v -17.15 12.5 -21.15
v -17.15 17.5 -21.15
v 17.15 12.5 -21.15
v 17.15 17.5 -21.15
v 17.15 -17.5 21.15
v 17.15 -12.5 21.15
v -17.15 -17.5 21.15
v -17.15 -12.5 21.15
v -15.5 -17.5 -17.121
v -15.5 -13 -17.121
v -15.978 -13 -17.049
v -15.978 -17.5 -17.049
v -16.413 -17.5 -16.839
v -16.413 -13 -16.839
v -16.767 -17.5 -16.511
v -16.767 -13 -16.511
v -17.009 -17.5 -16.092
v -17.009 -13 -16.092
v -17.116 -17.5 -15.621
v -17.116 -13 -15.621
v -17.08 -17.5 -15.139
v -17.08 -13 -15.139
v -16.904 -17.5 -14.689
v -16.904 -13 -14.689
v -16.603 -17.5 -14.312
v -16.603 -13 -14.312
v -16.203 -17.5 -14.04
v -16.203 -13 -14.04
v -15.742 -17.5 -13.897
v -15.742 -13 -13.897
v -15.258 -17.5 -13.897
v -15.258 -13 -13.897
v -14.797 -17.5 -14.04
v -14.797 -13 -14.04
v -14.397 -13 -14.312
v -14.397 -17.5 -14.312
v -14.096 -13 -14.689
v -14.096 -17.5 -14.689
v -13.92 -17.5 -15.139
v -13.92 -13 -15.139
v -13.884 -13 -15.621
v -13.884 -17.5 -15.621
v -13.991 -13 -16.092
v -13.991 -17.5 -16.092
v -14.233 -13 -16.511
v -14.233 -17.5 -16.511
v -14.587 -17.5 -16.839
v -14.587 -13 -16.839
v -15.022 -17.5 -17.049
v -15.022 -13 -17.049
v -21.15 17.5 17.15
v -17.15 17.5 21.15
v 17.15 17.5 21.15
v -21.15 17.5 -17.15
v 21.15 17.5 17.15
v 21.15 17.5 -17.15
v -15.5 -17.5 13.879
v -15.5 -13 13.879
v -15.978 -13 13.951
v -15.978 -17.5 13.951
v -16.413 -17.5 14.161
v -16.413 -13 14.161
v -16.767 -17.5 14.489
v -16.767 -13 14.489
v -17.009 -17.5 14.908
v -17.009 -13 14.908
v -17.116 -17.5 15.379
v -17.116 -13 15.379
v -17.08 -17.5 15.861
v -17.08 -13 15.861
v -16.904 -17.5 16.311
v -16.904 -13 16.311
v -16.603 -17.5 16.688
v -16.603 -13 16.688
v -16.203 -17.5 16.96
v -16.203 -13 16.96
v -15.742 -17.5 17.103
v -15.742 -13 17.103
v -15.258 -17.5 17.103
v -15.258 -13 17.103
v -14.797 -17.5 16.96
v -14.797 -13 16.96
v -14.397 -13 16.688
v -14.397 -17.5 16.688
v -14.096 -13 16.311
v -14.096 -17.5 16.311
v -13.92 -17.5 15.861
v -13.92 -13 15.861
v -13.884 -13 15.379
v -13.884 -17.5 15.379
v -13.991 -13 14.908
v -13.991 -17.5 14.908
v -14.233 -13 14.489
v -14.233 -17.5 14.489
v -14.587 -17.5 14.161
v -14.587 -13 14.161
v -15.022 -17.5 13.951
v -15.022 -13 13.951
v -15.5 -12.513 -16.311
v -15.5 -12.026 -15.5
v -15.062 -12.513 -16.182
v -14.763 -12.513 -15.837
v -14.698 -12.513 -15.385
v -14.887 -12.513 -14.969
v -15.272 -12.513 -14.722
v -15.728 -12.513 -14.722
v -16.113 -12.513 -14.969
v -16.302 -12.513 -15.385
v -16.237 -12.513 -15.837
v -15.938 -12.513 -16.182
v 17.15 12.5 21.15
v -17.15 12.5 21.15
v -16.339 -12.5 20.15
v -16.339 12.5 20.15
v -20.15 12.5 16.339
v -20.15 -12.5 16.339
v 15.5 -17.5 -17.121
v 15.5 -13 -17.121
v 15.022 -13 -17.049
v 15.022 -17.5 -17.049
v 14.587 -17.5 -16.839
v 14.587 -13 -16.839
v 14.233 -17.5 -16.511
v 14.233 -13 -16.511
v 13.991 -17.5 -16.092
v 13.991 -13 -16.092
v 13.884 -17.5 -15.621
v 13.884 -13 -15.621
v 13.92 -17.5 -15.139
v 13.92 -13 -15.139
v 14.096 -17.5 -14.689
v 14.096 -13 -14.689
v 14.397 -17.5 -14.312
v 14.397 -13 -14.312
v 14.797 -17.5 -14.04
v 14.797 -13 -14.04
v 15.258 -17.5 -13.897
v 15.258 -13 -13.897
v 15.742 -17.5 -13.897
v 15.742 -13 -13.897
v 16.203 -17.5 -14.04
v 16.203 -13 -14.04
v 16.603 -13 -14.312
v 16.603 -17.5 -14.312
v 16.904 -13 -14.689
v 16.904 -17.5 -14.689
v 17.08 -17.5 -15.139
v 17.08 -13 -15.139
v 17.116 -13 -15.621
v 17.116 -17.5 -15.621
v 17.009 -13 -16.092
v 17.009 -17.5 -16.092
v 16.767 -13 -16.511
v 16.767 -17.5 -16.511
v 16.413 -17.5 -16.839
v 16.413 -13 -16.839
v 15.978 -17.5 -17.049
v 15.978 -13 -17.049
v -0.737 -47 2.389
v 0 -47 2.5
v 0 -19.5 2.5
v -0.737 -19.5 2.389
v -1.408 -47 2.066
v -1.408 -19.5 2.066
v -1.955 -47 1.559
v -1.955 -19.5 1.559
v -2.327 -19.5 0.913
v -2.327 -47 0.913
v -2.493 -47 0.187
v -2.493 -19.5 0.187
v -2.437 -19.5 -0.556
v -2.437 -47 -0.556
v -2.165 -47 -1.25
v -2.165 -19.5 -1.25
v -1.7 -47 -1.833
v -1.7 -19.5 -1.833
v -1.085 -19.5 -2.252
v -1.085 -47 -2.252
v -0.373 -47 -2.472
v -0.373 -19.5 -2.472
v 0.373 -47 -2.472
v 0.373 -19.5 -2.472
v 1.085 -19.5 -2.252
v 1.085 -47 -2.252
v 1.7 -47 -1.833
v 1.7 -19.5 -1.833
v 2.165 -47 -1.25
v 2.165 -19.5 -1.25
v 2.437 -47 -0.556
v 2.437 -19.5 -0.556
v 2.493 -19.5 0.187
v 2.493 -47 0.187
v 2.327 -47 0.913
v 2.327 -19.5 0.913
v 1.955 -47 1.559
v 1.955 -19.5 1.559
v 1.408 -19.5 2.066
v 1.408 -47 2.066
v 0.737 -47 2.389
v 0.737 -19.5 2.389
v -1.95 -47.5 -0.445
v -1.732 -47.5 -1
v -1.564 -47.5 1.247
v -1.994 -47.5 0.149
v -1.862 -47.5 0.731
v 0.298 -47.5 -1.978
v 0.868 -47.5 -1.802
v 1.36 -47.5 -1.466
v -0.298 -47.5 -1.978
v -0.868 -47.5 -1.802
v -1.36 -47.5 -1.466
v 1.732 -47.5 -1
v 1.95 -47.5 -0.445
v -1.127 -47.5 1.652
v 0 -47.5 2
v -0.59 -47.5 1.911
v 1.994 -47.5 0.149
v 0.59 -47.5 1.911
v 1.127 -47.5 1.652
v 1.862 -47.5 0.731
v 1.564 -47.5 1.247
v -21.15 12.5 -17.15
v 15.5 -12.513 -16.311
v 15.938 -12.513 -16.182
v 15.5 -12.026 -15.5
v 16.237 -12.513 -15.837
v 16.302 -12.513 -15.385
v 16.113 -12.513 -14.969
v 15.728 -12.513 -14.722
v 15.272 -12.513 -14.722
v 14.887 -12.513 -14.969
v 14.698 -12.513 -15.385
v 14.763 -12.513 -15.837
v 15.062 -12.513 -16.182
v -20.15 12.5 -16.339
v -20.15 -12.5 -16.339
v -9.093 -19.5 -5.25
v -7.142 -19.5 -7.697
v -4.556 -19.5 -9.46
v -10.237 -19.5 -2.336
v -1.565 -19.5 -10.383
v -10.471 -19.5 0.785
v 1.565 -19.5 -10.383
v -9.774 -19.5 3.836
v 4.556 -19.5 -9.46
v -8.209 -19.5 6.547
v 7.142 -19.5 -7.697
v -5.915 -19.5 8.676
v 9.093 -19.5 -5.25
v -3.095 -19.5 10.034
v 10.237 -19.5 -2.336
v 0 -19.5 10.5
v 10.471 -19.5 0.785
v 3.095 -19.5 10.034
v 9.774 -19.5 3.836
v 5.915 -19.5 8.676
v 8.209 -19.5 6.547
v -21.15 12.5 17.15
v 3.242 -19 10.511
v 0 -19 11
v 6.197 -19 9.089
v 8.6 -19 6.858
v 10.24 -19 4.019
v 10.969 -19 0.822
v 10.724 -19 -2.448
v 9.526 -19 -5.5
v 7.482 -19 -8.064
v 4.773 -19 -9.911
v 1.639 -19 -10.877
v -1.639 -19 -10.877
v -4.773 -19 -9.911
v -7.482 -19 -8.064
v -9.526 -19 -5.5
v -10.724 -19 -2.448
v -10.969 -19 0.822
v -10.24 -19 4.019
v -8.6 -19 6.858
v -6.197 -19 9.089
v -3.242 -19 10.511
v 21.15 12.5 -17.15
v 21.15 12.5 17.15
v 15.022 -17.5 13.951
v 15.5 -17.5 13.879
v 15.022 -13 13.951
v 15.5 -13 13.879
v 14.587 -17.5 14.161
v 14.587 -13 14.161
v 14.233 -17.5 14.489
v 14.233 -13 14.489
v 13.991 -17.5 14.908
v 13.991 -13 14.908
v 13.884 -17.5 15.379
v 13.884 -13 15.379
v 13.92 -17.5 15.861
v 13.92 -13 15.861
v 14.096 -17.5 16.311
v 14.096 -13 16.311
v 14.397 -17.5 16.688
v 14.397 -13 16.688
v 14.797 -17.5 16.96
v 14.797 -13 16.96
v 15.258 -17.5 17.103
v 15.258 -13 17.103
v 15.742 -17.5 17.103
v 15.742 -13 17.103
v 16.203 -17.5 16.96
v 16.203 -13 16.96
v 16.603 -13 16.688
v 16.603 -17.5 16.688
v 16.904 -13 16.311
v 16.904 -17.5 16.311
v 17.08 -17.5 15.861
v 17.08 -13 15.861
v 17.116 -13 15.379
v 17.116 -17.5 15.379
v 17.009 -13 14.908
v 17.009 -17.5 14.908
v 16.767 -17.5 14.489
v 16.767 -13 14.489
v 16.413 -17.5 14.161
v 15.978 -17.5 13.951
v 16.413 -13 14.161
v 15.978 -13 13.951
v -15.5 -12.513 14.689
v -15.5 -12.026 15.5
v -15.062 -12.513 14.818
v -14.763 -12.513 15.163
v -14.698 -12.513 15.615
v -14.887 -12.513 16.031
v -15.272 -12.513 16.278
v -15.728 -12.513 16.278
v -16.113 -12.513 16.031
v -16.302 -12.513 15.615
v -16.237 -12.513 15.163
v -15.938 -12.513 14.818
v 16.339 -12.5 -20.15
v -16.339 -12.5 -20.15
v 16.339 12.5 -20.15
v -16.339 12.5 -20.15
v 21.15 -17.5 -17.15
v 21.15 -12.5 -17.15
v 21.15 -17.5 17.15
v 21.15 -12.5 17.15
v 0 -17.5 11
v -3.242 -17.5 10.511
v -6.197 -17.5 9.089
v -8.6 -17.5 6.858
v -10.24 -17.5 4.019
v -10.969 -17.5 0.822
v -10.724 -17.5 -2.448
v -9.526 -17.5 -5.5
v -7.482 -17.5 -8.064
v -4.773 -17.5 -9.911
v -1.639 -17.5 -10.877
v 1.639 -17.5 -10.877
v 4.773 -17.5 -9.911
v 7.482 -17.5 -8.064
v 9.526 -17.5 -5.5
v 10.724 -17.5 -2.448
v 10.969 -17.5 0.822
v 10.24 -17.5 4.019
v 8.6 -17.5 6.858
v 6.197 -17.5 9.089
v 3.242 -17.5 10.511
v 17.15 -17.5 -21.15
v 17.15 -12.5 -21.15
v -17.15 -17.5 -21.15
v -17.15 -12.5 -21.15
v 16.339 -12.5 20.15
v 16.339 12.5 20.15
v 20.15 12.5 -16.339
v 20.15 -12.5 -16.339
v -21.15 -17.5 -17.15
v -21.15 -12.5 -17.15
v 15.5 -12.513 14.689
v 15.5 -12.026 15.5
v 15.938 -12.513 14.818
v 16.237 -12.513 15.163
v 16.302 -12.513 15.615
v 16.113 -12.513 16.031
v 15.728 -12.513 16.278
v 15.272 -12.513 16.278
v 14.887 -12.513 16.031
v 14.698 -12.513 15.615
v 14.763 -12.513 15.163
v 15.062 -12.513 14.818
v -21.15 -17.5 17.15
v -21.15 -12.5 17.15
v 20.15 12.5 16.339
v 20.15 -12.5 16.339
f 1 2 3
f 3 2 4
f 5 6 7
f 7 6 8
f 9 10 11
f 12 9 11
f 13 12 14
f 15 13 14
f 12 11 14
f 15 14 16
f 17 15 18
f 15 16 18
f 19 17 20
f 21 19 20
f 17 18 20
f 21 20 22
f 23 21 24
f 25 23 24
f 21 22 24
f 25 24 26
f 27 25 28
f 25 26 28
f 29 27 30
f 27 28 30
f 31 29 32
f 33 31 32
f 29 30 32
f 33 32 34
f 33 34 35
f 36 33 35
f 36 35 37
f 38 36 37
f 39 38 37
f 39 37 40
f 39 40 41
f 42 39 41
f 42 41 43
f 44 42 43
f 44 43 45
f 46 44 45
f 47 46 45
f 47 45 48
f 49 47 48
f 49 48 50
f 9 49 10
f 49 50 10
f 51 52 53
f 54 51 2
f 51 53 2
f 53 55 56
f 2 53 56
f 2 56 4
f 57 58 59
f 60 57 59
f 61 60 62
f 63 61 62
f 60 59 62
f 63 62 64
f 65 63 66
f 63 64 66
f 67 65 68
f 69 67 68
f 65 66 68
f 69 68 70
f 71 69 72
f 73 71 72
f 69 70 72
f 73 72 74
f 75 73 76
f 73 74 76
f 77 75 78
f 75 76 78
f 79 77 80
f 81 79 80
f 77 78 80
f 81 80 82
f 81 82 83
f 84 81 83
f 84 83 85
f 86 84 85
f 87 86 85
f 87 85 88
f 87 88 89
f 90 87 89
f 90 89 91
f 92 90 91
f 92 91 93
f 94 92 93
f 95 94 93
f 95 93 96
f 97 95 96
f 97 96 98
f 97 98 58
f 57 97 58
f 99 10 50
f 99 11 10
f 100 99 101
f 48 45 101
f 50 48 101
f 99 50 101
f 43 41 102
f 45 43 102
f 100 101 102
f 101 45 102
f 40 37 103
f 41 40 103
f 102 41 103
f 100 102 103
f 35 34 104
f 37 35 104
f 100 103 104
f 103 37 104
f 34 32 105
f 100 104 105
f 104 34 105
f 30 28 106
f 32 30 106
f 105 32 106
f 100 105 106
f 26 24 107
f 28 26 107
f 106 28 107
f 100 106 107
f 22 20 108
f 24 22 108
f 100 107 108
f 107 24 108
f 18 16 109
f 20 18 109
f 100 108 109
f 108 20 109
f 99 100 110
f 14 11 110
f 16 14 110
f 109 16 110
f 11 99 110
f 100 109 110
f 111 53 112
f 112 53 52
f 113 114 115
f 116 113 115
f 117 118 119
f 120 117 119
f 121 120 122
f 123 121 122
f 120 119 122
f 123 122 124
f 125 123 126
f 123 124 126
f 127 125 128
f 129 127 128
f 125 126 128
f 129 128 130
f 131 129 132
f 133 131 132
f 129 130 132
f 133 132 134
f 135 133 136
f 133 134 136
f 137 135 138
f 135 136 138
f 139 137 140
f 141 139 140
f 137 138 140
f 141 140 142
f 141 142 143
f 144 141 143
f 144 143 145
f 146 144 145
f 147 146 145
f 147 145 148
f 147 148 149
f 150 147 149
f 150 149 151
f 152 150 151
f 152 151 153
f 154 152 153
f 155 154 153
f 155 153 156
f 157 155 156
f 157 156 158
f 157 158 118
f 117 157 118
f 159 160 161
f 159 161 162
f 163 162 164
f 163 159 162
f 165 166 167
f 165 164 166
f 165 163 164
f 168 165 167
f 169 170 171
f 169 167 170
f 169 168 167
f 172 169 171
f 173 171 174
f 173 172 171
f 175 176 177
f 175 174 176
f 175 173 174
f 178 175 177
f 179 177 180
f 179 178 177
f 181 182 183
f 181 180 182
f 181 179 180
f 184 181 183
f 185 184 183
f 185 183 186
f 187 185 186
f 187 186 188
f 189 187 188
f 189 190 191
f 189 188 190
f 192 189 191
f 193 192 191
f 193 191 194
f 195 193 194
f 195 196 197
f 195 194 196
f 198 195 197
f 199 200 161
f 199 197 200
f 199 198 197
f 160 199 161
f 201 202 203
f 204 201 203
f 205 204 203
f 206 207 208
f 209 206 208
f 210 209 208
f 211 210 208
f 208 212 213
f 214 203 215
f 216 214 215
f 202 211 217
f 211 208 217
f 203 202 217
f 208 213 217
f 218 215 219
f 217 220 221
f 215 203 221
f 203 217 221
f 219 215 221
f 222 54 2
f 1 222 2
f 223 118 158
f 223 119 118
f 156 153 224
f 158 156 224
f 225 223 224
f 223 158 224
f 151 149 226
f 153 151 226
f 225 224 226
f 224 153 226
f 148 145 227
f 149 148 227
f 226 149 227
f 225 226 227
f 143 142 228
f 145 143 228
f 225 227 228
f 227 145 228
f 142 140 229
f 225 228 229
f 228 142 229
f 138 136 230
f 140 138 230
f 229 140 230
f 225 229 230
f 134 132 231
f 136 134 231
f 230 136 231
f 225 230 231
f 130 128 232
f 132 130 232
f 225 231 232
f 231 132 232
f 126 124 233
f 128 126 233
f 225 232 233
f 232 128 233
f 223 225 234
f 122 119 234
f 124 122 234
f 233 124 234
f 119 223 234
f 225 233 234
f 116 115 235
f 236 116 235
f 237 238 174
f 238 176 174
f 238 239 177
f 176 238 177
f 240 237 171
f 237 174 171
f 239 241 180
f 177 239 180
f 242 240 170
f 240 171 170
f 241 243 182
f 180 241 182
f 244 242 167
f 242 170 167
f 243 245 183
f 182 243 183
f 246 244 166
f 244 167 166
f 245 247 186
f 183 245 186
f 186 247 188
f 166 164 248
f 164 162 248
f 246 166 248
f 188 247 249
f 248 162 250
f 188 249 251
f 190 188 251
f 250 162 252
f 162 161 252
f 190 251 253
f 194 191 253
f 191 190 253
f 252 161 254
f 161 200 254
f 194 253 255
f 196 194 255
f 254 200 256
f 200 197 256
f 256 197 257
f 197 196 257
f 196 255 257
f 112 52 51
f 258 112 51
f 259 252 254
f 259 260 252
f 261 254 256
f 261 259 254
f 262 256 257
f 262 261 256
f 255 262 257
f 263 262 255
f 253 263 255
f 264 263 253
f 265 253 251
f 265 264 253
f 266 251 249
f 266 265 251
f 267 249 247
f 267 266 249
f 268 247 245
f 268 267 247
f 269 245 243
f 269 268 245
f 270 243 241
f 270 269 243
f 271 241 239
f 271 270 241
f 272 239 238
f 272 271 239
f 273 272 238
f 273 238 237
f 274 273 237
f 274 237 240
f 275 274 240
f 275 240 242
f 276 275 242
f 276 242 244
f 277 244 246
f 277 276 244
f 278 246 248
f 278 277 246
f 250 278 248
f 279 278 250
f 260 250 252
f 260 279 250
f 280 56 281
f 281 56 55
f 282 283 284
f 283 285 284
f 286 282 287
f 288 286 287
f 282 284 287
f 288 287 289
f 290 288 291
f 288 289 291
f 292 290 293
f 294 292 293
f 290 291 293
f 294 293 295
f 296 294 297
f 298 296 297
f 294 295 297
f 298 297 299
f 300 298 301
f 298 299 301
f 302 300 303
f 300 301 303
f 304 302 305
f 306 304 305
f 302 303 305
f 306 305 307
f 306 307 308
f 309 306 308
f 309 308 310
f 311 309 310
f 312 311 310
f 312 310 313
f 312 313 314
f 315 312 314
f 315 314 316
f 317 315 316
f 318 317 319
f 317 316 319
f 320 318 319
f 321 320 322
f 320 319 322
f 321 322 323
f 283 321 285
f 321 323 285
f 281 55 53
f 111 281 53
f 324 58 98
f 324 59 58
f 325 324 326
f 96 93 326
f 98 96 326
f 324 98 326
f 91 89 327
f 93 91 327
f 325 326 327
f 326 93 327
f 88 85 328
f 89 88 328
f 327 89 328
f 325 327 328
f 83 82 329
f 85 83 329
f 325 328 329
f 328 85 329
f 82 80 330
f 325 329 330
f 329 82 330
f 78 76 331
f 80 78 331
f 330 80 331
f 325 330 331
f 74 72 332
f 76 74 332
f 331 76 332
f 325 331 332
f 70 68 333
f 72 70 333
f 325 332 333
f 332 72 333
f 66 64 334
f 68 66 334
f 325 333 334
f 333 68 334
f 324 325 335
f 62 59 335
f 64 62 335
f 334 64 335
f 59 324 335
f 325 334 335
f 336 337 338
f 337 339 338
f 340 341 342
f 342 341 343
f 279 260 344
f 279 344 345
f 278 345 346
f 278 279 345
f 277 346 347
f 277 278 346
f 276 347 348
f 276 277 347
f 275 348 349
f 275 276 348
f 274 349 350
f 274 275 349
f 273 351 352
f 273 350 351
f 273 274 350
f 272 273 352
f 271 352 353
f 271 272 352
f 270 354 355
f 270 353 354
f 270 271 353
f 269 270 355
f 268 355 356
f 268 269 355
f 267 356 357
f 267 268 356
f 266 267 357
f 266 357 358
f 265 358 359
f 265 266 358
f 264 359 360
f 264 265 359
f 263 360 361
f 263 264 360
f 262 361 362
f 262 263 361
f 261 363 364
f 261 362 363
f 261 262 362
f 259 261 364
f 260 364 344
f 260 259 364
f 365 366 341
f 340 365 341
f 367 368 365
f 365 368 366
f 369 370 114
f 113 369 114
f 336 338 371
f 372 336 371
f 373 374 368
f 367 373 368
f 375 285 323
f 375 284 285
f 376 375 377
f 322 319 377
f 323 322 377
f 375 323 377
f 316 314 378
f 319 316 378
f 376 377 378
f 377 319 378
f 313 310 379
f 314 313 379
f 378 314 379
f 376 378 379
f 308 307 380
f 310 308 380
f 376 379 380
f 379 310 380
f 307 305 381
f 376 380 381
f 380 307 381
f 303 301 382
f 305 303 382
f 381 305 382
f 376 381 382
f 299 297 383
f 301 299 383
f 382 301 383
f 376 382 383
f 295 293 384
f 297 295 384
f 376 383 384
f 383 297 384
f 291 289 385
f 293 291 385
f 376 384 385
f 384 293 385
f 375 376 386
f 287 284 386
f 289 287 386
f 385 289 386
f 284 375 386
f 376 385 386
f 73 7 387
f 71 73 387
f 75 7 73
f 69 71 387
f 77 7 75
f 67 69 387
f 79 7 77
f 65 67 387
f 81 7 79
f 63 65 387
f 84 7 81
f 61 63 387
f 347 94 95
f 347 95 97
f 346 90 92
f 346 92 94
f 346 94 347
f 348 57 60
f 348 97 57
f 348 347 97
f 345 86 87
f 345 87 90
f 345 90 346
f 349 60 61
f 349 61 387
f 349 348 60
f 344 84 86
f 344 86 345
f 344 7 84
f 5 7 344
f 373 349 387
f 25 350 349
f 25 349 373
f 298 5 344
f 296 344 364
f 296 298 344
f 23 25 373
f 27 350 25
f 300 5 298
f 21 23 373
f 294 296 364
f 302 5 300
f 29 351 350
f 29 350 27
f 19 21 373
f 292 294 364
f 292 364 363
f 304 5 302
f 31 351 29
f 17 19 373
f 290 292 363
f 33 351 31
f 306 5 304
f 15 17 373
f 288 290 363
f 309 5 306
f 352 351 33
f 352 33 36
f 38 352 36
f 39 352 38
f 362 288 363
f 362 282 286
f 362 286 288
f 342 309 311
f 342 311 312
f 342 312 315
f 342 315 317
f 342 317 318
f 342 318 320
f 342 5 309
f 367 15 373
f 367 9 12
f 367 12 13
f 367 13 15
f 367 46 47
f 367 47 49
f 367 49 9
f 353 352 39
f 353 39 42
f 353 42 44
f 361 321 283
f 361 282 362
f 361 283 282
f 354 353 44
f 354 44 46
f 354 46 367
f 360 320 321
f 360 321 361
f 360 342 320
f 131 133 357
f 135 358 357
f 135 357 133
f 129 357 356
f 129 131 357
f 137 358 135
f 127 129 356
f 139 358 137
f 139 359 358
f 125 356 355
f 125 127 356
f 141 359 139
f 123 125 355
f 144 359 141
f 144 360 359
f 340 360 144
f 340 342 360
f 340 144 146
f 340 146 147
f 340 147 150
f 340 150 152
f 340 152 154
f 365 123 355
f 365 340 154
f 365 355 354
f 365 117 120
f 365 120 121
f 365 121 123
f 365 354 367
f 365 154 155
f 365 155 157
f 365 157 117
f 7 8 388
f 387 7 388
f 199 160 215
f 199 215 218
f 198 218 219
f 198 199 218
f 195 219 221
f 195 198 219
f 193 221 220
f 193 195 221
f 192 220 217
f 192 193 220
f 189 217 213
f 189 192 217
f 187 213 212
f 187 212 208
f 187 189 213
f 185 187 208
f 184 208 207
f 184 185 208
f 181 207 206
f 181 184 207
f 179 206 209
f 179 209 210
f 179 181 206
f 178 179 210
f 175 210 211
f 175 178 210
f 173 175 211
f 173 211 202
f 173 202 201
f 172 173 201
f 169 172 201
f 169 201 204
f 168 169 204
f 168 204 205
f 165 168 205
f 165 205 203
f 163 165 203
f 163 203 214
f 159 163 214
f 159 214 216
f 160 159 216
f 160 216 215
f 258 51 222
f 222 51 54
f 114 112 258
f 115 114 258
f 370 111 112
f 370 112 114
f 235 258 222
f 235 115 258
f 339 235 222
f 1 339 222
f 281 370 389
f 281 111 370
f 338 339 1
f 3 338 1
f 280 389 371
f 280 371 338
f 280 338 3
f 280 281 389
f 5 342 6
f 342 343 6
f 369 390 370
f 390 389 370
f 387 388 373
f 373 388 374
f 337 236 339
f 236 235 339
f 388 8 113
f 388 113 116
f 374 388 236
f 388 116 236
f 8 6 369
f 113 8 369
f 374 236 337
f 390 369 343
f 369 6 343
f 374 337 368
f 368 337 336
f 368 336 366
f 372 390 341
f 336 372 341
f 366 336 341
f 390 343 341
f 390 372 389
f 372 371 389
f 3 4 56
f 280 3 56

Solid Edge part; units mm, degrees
sketch "Sketch1" plane through (0, 0, 0) normal (0, -1, 0) x (1, 0, 0)
  line L0 (-21.15, 17.15) -> (-21.15, -17.15)
  line L1 (-21.15, -17.15) -> (-17.15, -21.15)
  line L2 (-17.15, -21.15) -> (17.15, -21.15)
  line L3 (17.15, -21.15) -> (21.15, -17.15)
  line L4 (21.15, -17.15) -> (21.15, 17.15)
  line L5 (21.15, 17.15) -> (17.15, 21.15)
  line L6 (17.15, 21.15) -> (-17.15, 21.15)
  line L7 (-17.15, 21.15) -> (-21.15, 17.15)
  dimension "D1" = 42.3
  dimension "D2" = 4
extrude "Protrusion1" add sketch "Sketch1" along normal mid plane 35
sketch "Sketch2" plane through (0, 0, 0) normal (0, -1, 0) x (1, 0, 0)
  line L0 (-20.15, 16.3391) -> (-20.15, -16.3391)
  line L1 (-20.15, -16.3391) -> (-16.3391, -20.15)
  line L2 (-16.3391, -20.15) -> (16.3391, -20.15)
  line L3 (16.3391, -20.15) -> (20.15, -16.3391)
  line L4 (20.15, -16.3391) -> (20.15, 16.3391)
  line L5 (20.15, 16.3391) -> (16.3391, 20.15)
  line L6 (16.3391, 20.15) -> (-16.3391, 20.15)
  line L7 (-16.3391, 20.15) -> (-20.15, 16.3391)
  dimension "D1" = 1
extrude "ExtrudedCutout_1" cut sketch "Sketch2" along normal mid plane 25 flip side to cut
sketch "Sketch3" plane through (0, 0, 0) normal (1, 0, 0) x (0, 1, 0)
  line L0 (-17.5, 0) -> (-17.5, 11)
  line L1 (-17.5, 11) -> (-19.5, 11)
  line L2 (-19.5, 11) -> (-19.5, 2.5)
  line L3 (-19.5, 2.5) -> (-47.5, 2.5)
  line L4 (-47.5, 2.5) -> (-47.5, 0)
  dimension "D1" = 30
  dimension "D2" = 2
revolve "RevolvedProtrusion1" add sketch "Sketch3" angle 360 about axis through (0, -46, 0) along (0, 1, 0)
chamfer "Chamfer_1" distance 0.5 angle 45 2 edges at (0, -19.5, 11) (0, -47.5, 2.5)
hole "Hole_1" at (-15.5, -17.5, -15.5) direction (0, 1, 0) diameter 3.242 depth 4.5 tip angle 118 thread major 4 thread length 4
hole "Hole1" at (-15.5, -17.5, 15.5) direction (0, 1, 0) diameter 3.242 depth 4.5 tip angle 118 thread major 4 thread length 4
hole "Hole2" at (15.5, -17.5, -15.5) direction (0, 1, 0) diameter 3.242 depth 4.5 tip angle 118 thread major 4 thread length 4
hole "Hole3" at (15.5, -17.5, 15.5) direction (0, 1, 0) diameter 3.242 depth 4.5 tip angle 118 thread major 4 thread length 4
properties material "Stainless steel"
